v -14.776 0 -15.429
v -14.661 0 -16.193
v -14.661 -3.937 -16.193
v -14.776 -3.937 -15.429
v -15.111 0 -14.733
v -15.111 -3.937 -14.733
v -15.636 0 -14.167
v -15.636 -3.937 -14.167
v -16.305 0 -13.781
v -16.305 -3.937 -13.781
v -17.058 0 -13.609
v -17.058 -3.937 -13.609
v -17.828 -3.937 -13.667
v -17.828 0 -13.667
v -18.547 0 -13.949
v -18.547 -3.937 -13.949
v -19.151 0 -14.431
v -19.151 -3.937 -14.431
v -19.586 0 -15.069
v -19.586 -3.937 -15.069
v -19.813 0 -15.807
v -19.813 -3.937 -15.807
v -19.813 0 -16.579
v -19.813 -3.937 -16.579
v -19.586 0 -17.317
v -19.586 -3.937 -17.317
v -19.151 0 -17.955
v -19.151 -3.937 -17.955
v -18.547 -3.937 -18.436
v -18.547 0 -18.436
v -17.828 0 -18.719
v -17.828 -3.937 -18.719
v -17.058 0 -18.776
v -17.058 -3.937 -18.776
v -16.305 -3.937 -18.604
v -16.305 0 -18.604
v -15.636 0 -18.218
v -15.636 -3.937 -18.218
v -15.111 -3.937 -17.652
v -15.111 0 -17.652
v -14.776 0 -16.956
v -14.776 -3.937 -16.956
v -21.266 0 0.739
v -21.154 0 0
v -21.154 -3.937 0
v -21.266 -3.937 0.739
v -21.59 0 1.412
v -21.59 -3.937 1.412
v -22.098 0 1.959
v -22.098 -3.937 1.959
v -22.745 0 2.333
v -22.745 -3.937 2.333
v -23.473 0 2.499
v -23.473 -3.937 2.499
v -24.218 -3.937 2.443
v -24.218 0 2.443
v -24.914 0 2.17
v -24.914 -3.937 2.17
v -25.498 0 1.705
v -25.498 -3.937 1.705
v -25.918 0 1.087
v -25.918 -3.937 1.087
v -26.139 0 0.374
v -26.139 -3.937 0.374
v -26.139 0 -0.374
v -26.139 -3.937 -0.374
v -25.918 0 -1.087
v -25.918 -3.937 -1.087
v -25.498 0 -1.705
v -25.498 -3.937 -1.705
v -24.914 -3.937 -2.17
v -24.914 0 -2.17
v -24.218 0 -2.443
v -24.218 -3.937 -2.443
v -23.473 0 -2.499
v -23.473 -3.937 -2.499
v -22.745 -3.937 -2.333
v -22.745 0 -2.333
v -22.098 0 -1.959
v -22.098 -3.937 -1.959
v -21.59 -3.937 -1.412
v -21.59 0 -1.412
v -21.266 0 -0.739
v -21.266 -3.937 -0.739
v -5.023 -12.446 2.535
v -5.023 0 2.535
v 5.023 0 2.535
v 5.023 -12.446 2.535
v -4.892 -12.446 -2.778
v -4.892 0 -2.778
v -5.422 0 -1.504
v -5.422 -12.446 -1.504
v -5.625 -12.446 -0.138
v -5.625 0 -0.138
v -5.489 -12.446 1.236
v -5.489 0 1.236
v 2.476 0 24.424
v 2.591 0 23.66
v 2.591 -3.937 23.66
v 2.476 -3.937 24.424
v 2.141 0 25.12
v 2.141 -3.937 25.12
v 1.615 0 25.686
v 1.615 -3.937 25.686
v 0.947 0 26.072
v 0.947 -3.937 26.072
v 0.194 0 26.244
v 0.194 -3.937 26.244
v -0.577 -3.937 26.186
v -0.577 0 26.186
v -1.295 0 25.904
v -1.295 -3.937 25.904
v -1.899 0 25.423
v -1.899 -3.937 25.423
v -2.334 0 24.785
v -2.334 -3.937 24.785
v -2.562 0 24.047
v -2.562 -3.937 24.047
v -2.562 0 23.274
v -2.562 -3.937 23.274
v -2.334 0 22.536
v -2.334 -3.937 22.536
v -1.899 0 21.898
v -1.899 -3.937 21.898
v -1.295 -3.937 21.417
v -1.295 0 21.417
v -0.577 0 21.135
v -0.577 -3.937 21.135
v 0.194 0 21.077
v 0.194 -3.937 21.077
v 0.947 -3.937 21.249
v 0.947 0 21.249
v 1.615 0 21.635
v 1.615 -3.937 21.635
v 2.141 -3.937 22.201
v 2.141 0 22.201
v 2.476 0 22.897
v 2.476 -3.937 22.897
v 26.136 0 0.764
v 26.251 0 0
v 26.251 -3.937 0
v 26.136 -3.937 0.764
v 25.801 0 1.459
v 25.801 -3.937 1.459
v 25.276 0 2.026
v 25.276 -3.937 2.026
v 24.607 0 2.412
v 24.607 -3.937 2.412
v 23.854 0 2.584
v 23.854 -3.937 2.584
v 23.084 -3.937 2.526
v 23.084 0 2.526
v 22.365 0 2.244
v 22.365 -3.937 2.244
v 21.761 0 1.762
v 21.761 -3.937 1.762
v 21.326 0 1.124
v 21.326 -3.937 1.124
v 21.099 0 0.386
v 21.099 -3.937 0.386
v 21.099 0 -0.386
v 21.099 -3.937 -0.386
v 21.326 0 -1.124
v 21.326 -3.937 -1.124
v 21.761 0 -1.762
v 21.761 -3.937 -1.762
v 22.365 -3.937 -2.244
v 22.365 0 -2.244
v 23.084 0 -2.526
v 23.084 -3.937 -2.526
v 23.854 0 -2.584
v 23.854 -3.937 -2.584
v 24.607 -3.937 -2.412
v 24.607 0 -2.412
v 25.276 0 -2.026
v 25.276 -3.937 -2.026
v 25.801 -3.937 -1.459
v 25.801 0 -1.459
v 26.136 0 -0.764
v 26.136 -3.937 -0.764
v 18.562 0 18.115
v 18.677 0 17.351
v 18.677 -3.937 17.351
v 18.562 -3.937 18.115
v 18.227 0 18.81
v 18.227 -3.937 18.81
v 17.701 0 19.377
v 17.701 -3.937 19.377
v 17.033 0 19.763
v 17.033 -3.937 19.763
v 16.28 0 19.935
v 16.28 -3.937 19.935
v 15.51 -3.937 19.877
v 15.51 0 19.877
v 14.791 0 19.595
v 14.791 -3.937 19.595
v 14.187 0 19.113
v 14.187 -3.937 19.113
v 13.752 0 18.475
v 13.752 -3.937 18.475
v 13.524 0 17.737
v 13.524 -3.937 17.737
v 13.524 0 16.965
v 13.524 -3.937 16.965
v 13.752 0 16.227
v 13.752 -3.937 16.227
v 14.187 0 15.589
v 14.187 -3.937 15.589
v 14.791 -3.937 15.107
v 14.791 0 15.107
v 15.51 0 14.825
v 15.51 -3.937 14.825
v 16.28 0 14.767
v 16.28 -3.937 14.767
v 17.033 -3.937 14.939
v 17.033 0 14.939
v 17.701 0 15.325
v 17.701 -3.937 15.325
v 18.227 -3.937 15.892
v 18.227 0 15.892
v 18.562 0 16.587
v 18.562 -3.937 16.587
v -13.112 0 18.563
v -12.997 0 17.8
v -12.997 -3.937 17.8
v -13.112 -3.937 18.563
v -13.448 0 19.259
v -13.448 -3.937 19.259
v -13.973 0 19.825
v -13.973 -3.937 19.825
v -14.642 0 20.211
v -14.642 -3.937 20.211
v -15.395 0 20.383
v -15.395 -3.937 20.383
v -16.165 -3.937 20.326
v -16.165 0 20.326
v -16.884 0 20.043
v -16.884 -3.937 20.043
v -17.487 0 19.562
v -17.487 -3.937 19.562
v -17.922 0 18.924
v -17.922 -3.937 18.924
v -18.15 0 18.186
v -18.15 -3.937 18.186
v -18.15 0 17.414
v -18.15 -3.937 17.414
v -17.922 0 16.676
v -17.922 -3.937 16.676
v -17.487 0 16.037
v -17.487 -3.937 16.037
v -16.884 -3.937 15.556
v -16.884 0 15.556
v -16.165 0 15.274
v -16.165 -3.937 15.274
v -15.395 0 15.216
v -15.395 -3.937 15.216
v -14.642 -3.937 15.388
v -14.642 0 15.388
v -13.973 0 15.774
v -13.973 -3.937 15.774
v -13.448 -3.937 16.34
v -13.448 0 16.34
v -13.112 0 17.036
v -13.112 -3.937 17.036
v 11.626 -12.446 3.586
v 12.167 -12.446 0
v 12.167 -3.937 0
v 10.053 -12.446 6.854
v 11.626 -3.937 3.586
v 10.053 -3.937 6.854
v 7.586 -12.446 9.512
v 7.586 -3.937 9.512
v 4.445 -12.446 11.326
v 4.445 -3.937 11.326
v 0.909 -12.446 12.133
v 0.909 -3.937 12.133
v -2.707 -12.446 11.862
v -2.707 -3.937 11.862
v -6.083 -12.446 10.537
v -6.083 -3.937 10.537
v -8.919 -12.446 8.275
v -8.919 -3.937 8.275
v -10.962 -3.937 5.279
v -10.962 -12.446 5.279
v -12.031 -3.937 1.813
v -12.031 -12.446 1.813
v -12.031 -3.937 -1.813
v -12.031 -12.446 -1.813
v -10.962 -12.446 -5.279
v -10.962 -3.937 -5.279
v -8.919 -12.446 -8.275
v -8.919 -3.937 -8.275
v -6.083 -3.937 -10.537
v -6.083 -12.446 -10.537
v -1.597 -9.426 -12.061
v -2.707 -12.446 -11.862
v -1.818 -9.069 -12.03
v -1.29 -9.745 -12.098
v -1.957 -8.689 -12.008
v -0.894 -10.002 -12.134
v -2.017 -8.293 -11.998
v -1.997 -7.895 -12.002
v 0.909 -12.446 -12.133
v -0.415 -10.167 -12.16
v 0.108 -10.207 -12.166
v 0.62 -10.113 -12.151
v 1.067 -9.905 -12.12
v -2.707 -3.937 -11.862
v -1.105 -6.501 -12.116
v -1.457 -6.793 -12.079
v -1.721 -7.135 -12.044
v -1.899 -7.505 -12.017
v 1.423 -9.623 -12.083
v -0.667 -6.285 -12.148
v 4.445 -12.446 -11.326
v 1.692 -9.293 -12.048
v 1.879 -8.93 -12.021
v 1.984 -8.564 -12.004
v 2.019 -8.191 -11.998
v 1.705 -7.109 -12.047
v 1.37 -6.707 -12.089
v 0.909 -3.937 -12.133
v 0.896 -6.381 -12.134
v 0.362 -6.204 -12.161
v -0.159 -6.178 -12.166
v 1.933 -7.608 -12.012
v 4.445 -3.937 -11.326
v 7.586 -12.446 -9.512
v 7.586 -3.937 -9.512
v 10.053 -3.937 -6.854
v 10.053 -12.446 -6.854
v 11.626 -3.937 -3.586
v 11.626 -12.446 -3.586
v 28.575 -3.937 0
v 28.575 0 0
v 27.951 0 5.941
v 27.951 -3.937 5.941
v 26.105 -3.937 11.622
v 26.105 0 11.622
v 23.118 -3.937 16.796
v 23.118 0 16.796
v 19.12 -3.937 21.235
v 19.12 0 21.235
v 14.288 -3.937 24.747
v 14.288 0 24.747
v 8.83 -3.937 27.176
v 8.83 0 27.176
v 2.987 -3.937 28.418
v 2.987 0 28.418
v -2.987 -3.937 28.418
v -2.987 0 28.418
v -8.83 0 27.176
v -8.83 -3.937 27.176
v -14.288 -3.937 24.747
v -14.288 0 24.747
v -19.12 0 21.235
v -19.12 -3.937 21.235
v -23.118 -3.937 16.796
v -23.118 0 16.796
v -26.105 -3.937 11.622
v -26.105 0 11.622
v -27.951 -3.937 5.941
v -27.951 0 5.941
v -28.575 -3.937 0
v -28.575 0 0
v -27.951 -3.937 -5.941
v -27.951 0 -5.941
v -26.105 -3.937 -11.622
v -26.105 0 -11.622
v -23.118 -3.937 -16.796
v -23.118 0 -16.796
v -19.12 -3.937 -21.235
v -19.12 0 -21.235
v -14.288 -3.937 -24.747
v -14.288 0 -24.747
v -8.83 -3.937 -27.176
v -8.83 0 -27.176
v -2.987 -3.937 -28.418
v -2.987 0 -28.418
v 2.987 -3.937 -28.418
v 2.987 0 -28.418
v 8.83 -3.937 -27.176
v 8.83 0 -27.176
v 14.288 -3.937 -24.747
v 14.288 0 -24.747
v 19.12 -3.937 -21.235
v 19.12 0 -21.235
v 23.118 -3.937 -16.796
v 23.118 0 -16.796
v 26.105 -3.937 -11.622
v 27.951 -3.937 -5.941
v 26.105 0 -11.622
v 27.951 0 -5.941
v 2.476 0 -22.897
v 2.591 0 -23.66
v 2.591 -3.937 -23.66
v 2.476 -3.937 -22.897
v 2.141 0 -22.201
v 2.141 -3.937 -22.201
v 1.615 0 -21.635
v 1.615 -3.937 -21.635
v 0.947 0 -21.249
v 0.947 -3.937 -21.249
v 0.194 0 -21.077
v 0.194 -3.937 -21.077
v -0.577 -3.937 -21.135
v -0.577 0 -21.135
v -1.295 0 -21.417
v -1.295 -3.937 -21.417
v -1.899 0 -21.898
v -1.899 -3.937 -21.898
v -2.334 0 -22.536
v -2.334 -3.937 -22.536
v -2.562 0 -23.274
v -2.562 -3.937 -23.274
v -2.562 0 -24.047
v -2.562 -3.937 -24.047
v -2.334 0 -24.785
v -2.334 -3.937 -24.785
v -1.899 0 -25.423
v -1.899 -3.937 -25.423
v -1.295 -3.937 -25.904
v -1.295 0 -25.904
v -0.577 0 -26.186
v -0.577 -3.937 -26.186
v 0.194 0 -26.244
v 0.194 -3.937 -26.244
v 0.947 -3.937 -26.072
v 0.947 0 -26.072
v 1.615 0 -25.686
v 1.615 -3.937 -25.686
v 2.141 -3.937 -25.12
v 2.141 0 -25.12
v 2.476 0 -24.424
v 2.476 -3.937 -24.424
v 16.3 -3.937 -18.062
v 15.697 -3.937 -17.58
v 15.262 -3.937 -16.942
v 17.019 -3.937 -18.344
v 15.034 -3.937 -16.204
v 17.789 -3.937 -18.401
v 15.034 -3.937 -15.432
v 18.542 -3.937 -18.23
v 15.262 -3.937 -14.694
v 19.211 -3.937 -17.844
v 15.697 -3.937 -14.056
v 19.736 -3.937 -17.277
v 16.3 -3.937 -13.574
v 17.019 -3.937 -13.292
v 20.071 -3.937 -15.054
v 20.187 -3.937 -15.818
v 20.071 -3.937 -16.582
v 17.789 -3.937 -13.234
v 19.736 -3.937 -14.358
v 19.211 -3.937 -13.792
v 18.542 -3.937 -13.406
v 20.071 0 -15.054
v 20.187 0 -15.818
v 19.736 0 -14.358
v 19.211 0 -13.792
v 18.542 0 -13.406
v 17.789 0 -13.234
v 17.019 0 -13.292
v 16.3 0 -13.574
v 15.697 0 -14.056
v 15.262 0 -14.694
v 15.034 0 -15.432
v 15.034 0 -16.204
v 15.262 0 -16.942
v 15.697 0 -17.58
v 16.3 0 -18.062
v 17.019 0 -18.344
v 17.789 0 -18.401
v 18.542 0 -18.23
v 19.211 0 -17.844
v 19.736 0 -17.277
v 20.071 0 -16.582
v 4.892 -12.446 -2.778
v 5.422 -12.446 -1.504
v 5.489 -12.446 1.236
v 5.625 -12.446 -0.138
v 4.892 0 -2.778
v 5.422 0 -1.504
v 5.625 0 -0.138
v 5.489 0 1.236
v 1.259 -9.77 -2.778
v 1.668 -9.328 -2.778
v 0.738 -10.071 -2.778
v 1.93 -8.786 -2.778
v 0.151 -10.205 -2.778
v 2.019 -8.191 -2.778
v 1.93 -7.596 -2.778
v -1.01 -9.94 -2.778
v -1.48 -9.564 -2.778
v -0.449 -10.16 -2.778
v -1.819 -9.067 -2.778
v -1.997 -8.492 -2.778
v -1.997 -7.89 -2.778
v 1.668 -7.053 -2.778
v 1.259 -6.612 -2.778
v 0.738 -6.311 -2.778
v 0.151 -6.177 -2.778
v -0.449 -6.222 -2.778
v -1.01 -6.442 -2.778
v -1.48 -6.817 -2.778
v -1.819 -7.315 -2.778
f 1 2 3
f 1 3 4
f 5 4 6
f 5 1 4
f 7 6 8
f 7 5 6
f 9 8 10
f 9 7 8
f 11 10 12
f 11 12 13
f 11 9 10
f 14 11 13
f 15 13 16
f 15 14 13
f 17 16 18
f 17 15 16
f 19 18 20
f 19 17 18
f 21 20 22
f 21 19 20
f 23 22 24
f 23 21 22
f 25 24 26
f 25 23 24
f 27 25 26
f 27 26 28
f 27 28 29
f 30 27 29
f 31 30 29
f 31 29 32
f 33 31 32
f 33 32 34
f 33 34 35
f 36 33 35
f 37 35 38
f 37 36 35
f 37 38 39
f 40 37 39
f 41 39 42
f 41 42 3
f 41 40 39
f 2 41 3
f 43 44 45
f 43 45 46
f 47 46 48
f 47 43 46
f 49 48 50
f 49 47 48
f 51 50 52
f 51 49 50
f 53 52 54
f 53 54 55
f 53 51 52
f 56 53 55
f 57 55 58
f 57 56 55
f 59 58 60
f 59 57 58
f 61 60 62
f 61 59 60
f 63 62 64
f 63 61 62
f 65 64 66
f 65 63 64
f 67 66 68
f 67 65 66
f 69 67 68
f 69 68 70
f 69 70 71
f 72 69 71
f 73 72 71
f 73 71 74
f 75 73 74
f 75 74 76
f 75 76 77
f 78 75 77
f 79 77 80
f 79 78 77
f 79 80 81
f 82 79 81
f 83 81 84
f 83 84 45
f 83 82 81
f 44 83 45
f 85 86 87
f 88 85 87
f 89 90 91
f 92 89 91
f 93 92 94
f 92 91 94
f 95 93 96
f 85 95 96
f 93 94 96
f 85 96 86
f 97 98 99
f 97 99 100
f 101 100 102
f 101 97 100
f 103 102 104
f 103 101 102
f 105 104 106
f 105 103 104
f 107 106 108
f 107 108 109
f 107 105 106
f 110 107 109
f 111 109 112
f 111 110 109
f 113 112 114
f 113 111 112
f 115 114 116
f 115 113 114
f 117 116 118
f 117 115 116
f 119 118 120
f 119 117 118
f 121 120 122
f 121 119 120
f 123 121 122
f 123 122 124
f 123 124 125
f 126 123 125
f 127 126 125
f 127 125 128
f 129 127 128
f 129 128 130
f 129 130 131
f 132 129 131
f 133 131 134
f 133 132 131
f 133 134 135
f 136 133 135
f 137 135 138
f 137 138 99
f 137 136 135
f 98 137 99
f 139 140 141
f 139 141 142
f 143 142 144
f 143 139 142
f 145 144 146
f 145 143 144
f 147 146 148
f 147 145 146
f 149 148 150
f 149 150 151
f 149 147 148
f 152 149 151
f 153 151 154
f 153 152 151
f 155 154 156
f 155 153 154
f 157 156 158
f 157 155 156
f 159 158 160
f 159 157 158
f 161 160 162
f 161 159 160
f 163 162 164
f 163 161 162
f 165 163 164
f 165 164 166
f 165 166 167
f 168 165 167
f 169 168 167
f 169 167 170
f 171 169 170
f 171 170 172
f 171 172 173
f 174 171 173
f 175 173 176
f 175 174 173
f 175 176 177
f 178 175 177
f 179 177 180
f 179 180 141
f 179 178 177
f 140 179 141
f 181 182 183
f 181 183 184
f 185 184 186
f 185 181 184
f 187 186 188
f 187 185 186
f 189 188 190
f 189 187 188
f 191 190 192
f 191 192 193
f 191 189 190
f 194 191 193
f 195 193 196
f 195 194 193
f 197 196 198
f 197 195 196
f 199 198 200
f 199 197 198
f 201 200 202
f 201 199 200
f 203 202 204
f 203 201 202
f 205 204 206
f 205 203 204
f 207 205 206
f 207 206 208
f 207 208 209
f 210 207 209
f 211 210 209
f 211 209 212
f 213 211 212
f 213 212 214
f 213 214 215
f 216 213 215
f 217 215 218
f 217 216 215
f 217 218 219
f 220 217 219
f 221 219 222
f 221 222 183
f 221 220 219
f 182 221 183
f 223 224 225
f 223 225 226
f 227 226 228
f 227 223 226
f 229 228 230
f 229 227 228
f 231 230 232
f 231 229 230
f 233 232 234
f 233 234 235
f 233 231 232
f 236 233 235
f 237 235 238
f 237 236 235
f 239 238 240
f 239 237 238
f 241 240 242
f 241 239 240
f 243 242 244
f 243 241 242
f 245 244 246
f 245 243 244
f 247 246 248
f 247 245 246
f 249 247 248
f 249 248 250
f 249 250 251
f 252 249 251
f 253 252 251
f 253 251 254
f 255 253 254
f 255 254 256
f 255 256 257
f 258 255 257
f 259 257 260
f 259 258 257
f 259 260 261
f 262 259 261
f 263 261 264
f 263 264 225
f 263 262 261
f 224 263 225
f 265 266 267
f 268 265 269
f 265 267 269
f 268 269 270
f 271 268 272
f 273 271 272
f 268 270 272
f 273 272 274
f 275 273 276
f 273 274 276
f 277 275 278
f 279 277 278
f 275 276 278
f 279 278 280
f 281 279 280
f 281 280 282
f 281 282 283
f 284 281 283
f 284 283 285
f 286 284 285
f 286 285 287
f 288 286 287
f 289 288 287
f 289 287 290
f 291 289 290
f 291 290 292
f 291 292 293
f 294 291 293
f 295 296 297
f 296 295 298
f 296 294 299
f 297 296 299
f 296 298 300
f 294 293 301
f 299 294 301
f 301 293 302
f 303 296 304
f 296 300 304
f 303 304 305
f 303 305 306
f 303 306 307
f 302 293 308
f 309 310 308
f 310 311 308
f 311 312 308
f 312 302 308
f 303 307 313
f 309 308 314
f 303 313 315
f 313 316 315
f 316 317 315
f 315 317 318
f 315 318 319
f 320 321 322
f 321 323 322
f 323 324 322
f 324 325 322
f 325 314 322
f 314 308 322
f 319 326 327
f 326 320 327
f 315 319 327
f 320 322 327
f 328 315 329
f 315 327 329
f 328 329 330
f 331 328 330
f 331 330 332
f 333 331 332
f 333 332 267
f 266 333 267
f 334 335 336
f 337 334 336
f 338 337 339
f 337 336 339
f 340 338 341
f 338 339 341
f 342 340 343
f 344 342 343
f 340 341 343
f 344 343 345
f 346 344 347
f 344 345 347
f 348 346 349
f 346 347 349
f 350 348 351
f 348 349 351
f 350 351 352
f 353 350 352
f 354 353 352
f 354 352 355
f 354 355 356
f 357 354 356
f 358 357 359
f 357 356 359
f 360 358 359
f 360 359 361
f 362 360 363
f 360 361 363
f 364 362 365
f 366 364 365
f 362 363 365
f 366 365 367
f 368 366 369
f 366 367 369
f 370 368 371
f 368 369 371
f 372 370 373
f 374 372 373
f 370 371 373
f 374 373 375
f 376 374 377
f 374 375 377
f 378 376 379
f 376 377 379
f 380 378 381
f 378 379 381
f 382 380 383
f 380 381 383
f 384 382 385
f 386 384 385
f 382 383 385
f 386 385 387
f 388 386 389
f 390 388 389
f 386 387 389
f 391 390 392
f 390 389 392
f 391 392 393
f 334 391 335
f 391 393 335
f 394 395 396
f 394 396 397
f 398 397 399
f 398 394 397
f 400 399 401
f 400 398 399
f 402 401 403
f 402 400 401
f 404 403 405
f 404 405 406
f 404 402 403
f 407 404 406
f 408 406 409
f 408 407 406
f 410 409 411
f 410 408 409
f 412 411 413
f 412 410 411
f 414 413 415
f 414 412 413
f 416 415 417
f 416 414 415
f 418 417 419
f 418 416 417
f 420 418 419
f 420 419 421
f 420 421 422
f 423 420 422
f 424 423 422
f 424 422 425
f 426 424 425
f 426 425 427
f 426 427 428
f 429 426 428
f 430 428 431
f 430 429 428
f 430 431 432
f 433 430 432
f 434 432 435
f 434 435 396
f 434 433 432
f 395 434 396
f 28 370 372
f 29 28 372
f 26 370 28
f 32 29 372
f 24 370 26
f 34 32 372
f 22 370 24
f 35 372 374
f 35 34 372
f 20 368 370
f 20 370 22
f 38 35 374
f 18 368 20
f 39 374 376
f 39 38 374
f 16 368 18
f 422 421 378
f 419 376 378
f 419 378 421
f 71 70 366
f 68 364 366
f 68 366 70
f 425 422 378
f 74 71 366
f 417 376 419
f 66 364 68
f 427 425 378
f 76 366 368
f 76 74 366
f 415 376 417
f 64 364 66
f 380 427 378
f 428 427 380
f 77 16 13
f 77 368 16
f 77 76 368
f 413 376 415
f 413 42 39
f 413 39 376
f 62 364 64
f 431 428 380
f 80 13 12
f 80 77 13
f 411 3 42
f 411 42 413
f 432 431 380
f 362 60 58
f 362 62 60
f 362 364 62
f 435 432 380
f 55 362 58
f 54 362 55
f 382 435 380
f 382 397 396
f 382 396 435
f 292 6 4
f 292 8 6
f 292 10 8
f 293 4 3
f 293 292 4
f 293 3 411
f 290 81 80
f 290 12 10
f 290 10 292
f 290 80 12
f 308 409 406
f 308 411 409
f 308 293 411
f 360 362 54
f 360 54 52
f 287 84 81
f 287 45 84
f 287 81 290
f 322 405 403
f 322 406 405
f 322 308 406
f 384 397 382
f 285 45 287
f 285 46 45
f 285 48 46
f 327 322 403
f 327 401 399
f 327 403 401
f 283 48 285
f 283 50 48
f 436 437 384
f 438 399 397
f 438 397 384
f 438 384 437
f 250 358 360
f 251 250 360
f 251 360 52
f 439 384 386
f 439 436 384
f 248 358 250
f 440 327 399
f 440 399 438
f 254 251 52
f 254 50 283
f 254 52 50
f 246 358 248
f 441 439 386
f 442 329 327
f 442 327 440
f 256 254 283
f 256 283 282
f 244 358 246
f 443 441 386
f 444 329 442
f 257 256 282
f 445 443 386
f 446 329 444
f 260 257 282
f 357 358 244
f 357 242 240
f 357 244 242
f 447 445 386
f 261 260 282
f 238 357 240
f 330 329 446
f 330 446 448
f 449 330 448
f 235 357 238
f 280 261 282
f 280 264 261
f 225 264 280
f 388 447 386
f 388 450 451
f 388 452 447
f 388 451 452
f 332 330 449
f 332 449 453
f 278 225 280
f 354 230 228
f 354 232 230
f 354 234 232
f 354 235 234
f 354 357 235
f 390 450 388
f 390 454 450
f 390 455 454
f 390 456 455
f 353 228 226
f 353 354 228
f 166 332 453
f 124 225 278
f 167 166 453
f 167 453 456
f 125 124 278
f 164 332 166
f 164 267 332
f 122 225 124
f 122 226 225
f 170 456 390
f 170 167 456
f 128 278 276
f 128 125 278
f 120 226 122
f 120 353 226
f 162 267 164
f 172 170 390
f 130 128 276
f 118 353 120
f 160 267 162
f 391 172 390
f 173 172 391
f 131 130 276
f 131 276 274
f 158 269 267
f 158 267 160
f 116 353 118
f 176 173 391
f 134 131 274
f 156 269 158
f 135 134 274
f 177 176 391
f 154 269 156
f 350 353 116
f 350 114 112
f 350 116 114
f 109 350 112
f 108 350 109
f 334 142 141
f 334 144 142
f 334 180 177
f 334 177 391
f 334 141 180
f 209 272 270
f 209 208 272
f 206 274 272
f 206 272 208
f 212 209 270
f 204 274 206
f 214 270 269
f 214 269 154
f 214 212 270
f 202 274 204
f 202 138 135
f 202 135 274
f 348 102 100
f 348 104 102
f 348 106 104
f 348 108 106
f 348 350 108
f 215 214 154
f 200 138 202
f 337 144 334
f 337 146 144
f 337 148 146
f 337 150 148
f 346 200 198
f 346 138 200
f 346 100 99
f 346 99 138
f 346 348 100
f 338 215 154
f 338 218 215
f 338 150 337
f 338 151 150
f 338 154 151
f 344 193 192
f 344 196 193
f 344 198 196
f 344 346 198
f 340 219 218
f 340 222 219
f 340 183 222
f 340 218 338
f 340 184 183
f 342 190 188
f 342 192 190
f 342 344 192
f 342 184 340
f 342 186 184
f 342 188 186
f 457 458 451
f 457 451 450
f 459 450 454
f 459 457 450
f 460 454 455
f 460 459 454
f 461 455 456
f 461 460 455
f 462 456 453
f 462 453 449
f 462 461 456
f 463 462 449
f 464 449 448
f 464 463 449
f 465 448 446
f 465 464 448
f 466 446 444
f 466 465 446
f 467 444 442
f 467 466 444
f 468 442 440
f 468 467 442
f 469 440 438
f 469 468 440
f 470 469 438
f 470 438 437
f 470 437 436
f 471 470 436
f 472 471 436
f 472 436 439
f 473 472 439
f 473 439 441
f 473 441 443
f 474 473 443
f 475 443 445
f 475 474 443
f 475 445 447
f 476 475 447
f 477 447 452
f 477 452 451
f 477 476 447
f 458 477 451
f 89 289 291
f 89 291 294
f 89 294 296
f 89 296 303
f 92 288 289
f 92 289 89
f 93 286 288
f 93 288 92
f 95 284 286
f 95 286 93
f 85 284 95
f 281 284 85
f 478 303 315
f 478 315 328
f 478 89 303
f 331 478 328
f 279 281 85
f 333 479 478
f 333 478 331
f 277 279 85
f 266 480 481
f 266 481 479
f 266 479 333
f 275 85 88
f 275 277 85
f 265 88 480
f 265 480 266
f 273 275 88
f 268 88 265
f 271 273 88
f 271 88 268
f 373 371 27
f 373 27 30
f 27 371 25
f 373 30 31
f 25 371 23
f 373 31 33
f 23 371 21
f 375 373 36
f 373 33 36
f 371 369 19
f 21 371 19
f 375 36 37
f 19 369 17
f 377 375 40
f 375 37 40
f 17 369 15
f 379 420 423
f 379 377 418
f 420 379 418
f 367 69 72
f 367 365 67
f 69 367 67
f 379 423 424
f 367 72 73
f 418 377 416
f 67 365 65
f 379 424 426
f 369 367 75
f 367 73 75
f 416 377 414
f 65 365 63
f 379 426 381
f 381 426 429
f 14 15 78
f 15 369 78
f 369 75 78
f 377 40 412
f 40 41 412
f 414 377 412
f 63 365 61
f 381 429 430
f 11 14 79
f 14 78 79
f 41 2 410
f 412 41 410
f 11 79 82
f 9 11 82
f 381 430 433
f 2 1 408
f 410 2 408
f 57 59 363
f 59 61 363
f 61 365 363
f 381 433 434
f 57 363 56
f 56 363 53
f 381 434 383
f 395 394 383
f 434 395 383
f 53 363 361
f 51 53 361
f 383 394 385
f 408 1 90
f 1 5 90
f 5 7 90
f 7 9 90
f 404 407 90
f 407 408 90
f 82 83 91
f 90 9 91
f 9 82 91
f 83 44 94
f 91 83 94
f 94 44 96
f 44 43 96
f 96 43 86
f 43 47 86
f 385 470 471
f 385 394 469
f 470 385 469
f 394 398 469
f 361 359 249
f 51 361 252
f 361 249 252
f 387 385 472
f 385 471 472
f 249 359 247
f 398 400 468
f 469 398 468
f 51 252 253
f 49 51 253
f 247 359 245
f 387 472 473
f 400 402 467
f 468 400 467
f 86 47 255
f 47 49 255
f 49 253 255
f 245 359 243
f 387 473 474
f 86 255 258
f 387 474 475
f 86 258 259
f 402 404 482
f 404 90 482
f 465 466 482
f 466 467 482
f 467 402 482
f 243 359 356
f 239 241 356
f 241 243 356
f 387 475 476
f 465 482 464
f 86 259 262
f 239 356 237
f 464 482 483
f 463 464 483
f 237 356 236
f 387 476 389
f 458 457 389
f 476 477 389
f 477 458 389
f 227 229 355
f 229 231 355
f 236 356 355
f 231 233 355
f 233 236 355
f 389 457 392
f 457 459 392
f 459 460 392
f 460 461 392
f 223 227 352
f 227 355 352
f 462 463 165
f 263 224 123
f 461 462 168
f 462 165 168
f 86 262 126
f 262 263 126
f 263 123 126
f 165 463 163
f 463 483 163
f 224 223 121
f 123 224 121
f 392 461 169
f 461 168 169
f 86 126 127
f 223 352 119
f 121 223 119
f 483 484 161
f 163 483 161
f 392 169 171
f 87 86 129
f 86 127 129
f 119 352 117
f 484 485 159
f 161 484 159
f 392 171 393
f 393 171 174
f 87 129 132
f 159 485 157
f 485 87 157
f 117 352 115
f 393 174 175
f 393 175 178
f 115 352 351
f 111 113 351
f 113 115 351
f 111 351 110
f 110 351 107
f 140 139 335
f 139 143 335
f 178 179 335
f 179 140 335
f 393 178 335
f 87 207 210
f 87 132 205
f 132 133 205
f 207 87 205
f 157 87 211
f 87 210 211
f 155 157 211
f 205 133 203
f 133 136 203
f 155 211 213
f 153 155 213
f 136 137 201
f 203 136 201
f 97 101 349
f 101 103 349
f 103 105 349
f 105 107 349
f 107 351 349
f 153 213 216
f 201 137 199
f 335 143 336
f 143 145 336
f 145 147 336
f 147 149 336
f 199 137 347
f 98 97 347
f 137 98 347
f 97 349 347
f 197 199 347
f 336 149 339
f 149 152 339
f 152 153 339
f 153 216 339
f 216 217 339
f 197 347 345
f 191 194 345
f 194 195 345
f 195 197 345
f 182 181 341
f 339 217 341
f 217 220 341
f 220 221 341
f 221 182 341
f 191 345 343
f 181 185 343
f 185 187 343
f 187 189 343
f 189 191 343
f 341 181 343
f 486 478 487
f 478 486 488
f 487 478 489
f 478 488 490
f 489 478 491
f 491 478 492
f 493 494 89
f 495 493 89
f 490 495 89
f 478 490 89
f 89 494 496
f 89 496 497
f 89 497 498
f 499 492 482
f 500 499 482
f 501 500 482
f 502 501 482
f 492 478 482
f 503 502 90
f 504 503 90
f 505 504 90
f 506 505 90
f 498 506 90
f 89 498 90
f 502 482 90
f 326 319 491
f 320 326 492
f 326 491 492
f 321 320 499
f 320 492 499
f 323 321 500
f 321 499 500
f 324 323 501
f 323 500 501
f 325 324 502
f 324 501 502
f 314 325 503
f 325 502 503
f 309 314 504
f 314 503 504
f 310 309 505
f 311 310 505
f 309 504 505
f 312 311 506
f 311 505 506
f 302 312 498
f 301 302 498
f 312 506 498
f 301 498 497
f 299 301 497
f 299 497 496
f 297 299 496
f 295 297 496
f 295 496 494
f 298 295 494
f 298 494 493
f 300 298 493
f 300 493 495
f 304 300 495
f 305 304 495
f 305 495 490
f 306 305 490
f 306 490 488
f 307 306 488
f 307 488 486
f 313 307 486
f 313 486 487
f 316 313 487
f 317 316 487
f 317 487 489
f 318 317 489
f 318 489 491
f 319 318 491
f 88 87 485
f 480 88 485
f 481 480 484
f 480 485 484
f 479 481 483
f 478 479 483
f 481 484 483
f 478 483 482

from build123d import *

# Parameters (mm, degrees)
F0_R     = 12.1666
F1_DEPTH = 12.446
F0_R_2   = 28.575
F0_R_3   = 2.5908
F0_R_4   = 2.506168
F2_DEPTH = 3.937
F3_R     = 2.0193
F4_DEPTH = 25.4


with BuildPart() as f1:
    # F0 (on Front) → F1 (new body)
    with BuildSketch(Plane.XZ):
        Circle(F0_R)
        with BuildLine():
            ThreePointArc((-4.892358, -2.778407), (-5.624556, -0.138136), (-5.02285, 2.534895))
            Line((-5.02285, 2.534895), (5.02285, 2.534895))
            ThreePointArc((5.02285, 2.534895), (5.624556, -0.138136), (4.892358, -2.778407))
            Line((4.892358, -2.778407), (-4.892358, -2.778407))
        make_face(mode=Mode.SUBTRACT)
    extrude(amount=F1_DEPTH)

    # F0 (on Front) → F2 (join)
    with BuildSketch(Plane.XZ):
        Circle(F0_R_2)
        with Locations((-17.251513, -16.192724)):
            Circle(F0_R_3, mode=Mode.SUBTRACT)
        with Locations((0, -23.660495)):
            Circle(F0_R_3, mode=Mode.SUBTRACT)
        with Locations((17.595791, -15.817938)):
            Circle(F0_R_3, mode=Mode.SUBTRACT)
        with Locations((-23.660495, 0)):
            Circle(F0_R_4, mode=Mode.SUBTRACT)
        with Locations((-15.588157, 17.799674)):
            Circle(F0_R_3, mode=Mode.SUBTRACT)
        Circle(F0_R, mode=Mode.SUBTRACT)
        with Locations((23.660495, 0)):
            Circle(F0_R_3, mode=Mode.SUBTRACT)
        with Locations((0, 23.660495)):
            Circle(F0_R_3, mode=Mode.SUBTRACT)
        with Locations((16.086078, 17.350997)):
            Circle(F0_R_3, mode=Mode.SUBTRACT)
    extrude(amount=F2_DEPTH)

    # F3 (on Top) → F4 (cut)
    with BuildSketch(Plane.XY):
        with Locations((0, -8.190851)):
            Circle(F3_R)
    extrude(amount=-F4_DEPTH, mode=Mode.SUBTRACT)


solid = f1.part
